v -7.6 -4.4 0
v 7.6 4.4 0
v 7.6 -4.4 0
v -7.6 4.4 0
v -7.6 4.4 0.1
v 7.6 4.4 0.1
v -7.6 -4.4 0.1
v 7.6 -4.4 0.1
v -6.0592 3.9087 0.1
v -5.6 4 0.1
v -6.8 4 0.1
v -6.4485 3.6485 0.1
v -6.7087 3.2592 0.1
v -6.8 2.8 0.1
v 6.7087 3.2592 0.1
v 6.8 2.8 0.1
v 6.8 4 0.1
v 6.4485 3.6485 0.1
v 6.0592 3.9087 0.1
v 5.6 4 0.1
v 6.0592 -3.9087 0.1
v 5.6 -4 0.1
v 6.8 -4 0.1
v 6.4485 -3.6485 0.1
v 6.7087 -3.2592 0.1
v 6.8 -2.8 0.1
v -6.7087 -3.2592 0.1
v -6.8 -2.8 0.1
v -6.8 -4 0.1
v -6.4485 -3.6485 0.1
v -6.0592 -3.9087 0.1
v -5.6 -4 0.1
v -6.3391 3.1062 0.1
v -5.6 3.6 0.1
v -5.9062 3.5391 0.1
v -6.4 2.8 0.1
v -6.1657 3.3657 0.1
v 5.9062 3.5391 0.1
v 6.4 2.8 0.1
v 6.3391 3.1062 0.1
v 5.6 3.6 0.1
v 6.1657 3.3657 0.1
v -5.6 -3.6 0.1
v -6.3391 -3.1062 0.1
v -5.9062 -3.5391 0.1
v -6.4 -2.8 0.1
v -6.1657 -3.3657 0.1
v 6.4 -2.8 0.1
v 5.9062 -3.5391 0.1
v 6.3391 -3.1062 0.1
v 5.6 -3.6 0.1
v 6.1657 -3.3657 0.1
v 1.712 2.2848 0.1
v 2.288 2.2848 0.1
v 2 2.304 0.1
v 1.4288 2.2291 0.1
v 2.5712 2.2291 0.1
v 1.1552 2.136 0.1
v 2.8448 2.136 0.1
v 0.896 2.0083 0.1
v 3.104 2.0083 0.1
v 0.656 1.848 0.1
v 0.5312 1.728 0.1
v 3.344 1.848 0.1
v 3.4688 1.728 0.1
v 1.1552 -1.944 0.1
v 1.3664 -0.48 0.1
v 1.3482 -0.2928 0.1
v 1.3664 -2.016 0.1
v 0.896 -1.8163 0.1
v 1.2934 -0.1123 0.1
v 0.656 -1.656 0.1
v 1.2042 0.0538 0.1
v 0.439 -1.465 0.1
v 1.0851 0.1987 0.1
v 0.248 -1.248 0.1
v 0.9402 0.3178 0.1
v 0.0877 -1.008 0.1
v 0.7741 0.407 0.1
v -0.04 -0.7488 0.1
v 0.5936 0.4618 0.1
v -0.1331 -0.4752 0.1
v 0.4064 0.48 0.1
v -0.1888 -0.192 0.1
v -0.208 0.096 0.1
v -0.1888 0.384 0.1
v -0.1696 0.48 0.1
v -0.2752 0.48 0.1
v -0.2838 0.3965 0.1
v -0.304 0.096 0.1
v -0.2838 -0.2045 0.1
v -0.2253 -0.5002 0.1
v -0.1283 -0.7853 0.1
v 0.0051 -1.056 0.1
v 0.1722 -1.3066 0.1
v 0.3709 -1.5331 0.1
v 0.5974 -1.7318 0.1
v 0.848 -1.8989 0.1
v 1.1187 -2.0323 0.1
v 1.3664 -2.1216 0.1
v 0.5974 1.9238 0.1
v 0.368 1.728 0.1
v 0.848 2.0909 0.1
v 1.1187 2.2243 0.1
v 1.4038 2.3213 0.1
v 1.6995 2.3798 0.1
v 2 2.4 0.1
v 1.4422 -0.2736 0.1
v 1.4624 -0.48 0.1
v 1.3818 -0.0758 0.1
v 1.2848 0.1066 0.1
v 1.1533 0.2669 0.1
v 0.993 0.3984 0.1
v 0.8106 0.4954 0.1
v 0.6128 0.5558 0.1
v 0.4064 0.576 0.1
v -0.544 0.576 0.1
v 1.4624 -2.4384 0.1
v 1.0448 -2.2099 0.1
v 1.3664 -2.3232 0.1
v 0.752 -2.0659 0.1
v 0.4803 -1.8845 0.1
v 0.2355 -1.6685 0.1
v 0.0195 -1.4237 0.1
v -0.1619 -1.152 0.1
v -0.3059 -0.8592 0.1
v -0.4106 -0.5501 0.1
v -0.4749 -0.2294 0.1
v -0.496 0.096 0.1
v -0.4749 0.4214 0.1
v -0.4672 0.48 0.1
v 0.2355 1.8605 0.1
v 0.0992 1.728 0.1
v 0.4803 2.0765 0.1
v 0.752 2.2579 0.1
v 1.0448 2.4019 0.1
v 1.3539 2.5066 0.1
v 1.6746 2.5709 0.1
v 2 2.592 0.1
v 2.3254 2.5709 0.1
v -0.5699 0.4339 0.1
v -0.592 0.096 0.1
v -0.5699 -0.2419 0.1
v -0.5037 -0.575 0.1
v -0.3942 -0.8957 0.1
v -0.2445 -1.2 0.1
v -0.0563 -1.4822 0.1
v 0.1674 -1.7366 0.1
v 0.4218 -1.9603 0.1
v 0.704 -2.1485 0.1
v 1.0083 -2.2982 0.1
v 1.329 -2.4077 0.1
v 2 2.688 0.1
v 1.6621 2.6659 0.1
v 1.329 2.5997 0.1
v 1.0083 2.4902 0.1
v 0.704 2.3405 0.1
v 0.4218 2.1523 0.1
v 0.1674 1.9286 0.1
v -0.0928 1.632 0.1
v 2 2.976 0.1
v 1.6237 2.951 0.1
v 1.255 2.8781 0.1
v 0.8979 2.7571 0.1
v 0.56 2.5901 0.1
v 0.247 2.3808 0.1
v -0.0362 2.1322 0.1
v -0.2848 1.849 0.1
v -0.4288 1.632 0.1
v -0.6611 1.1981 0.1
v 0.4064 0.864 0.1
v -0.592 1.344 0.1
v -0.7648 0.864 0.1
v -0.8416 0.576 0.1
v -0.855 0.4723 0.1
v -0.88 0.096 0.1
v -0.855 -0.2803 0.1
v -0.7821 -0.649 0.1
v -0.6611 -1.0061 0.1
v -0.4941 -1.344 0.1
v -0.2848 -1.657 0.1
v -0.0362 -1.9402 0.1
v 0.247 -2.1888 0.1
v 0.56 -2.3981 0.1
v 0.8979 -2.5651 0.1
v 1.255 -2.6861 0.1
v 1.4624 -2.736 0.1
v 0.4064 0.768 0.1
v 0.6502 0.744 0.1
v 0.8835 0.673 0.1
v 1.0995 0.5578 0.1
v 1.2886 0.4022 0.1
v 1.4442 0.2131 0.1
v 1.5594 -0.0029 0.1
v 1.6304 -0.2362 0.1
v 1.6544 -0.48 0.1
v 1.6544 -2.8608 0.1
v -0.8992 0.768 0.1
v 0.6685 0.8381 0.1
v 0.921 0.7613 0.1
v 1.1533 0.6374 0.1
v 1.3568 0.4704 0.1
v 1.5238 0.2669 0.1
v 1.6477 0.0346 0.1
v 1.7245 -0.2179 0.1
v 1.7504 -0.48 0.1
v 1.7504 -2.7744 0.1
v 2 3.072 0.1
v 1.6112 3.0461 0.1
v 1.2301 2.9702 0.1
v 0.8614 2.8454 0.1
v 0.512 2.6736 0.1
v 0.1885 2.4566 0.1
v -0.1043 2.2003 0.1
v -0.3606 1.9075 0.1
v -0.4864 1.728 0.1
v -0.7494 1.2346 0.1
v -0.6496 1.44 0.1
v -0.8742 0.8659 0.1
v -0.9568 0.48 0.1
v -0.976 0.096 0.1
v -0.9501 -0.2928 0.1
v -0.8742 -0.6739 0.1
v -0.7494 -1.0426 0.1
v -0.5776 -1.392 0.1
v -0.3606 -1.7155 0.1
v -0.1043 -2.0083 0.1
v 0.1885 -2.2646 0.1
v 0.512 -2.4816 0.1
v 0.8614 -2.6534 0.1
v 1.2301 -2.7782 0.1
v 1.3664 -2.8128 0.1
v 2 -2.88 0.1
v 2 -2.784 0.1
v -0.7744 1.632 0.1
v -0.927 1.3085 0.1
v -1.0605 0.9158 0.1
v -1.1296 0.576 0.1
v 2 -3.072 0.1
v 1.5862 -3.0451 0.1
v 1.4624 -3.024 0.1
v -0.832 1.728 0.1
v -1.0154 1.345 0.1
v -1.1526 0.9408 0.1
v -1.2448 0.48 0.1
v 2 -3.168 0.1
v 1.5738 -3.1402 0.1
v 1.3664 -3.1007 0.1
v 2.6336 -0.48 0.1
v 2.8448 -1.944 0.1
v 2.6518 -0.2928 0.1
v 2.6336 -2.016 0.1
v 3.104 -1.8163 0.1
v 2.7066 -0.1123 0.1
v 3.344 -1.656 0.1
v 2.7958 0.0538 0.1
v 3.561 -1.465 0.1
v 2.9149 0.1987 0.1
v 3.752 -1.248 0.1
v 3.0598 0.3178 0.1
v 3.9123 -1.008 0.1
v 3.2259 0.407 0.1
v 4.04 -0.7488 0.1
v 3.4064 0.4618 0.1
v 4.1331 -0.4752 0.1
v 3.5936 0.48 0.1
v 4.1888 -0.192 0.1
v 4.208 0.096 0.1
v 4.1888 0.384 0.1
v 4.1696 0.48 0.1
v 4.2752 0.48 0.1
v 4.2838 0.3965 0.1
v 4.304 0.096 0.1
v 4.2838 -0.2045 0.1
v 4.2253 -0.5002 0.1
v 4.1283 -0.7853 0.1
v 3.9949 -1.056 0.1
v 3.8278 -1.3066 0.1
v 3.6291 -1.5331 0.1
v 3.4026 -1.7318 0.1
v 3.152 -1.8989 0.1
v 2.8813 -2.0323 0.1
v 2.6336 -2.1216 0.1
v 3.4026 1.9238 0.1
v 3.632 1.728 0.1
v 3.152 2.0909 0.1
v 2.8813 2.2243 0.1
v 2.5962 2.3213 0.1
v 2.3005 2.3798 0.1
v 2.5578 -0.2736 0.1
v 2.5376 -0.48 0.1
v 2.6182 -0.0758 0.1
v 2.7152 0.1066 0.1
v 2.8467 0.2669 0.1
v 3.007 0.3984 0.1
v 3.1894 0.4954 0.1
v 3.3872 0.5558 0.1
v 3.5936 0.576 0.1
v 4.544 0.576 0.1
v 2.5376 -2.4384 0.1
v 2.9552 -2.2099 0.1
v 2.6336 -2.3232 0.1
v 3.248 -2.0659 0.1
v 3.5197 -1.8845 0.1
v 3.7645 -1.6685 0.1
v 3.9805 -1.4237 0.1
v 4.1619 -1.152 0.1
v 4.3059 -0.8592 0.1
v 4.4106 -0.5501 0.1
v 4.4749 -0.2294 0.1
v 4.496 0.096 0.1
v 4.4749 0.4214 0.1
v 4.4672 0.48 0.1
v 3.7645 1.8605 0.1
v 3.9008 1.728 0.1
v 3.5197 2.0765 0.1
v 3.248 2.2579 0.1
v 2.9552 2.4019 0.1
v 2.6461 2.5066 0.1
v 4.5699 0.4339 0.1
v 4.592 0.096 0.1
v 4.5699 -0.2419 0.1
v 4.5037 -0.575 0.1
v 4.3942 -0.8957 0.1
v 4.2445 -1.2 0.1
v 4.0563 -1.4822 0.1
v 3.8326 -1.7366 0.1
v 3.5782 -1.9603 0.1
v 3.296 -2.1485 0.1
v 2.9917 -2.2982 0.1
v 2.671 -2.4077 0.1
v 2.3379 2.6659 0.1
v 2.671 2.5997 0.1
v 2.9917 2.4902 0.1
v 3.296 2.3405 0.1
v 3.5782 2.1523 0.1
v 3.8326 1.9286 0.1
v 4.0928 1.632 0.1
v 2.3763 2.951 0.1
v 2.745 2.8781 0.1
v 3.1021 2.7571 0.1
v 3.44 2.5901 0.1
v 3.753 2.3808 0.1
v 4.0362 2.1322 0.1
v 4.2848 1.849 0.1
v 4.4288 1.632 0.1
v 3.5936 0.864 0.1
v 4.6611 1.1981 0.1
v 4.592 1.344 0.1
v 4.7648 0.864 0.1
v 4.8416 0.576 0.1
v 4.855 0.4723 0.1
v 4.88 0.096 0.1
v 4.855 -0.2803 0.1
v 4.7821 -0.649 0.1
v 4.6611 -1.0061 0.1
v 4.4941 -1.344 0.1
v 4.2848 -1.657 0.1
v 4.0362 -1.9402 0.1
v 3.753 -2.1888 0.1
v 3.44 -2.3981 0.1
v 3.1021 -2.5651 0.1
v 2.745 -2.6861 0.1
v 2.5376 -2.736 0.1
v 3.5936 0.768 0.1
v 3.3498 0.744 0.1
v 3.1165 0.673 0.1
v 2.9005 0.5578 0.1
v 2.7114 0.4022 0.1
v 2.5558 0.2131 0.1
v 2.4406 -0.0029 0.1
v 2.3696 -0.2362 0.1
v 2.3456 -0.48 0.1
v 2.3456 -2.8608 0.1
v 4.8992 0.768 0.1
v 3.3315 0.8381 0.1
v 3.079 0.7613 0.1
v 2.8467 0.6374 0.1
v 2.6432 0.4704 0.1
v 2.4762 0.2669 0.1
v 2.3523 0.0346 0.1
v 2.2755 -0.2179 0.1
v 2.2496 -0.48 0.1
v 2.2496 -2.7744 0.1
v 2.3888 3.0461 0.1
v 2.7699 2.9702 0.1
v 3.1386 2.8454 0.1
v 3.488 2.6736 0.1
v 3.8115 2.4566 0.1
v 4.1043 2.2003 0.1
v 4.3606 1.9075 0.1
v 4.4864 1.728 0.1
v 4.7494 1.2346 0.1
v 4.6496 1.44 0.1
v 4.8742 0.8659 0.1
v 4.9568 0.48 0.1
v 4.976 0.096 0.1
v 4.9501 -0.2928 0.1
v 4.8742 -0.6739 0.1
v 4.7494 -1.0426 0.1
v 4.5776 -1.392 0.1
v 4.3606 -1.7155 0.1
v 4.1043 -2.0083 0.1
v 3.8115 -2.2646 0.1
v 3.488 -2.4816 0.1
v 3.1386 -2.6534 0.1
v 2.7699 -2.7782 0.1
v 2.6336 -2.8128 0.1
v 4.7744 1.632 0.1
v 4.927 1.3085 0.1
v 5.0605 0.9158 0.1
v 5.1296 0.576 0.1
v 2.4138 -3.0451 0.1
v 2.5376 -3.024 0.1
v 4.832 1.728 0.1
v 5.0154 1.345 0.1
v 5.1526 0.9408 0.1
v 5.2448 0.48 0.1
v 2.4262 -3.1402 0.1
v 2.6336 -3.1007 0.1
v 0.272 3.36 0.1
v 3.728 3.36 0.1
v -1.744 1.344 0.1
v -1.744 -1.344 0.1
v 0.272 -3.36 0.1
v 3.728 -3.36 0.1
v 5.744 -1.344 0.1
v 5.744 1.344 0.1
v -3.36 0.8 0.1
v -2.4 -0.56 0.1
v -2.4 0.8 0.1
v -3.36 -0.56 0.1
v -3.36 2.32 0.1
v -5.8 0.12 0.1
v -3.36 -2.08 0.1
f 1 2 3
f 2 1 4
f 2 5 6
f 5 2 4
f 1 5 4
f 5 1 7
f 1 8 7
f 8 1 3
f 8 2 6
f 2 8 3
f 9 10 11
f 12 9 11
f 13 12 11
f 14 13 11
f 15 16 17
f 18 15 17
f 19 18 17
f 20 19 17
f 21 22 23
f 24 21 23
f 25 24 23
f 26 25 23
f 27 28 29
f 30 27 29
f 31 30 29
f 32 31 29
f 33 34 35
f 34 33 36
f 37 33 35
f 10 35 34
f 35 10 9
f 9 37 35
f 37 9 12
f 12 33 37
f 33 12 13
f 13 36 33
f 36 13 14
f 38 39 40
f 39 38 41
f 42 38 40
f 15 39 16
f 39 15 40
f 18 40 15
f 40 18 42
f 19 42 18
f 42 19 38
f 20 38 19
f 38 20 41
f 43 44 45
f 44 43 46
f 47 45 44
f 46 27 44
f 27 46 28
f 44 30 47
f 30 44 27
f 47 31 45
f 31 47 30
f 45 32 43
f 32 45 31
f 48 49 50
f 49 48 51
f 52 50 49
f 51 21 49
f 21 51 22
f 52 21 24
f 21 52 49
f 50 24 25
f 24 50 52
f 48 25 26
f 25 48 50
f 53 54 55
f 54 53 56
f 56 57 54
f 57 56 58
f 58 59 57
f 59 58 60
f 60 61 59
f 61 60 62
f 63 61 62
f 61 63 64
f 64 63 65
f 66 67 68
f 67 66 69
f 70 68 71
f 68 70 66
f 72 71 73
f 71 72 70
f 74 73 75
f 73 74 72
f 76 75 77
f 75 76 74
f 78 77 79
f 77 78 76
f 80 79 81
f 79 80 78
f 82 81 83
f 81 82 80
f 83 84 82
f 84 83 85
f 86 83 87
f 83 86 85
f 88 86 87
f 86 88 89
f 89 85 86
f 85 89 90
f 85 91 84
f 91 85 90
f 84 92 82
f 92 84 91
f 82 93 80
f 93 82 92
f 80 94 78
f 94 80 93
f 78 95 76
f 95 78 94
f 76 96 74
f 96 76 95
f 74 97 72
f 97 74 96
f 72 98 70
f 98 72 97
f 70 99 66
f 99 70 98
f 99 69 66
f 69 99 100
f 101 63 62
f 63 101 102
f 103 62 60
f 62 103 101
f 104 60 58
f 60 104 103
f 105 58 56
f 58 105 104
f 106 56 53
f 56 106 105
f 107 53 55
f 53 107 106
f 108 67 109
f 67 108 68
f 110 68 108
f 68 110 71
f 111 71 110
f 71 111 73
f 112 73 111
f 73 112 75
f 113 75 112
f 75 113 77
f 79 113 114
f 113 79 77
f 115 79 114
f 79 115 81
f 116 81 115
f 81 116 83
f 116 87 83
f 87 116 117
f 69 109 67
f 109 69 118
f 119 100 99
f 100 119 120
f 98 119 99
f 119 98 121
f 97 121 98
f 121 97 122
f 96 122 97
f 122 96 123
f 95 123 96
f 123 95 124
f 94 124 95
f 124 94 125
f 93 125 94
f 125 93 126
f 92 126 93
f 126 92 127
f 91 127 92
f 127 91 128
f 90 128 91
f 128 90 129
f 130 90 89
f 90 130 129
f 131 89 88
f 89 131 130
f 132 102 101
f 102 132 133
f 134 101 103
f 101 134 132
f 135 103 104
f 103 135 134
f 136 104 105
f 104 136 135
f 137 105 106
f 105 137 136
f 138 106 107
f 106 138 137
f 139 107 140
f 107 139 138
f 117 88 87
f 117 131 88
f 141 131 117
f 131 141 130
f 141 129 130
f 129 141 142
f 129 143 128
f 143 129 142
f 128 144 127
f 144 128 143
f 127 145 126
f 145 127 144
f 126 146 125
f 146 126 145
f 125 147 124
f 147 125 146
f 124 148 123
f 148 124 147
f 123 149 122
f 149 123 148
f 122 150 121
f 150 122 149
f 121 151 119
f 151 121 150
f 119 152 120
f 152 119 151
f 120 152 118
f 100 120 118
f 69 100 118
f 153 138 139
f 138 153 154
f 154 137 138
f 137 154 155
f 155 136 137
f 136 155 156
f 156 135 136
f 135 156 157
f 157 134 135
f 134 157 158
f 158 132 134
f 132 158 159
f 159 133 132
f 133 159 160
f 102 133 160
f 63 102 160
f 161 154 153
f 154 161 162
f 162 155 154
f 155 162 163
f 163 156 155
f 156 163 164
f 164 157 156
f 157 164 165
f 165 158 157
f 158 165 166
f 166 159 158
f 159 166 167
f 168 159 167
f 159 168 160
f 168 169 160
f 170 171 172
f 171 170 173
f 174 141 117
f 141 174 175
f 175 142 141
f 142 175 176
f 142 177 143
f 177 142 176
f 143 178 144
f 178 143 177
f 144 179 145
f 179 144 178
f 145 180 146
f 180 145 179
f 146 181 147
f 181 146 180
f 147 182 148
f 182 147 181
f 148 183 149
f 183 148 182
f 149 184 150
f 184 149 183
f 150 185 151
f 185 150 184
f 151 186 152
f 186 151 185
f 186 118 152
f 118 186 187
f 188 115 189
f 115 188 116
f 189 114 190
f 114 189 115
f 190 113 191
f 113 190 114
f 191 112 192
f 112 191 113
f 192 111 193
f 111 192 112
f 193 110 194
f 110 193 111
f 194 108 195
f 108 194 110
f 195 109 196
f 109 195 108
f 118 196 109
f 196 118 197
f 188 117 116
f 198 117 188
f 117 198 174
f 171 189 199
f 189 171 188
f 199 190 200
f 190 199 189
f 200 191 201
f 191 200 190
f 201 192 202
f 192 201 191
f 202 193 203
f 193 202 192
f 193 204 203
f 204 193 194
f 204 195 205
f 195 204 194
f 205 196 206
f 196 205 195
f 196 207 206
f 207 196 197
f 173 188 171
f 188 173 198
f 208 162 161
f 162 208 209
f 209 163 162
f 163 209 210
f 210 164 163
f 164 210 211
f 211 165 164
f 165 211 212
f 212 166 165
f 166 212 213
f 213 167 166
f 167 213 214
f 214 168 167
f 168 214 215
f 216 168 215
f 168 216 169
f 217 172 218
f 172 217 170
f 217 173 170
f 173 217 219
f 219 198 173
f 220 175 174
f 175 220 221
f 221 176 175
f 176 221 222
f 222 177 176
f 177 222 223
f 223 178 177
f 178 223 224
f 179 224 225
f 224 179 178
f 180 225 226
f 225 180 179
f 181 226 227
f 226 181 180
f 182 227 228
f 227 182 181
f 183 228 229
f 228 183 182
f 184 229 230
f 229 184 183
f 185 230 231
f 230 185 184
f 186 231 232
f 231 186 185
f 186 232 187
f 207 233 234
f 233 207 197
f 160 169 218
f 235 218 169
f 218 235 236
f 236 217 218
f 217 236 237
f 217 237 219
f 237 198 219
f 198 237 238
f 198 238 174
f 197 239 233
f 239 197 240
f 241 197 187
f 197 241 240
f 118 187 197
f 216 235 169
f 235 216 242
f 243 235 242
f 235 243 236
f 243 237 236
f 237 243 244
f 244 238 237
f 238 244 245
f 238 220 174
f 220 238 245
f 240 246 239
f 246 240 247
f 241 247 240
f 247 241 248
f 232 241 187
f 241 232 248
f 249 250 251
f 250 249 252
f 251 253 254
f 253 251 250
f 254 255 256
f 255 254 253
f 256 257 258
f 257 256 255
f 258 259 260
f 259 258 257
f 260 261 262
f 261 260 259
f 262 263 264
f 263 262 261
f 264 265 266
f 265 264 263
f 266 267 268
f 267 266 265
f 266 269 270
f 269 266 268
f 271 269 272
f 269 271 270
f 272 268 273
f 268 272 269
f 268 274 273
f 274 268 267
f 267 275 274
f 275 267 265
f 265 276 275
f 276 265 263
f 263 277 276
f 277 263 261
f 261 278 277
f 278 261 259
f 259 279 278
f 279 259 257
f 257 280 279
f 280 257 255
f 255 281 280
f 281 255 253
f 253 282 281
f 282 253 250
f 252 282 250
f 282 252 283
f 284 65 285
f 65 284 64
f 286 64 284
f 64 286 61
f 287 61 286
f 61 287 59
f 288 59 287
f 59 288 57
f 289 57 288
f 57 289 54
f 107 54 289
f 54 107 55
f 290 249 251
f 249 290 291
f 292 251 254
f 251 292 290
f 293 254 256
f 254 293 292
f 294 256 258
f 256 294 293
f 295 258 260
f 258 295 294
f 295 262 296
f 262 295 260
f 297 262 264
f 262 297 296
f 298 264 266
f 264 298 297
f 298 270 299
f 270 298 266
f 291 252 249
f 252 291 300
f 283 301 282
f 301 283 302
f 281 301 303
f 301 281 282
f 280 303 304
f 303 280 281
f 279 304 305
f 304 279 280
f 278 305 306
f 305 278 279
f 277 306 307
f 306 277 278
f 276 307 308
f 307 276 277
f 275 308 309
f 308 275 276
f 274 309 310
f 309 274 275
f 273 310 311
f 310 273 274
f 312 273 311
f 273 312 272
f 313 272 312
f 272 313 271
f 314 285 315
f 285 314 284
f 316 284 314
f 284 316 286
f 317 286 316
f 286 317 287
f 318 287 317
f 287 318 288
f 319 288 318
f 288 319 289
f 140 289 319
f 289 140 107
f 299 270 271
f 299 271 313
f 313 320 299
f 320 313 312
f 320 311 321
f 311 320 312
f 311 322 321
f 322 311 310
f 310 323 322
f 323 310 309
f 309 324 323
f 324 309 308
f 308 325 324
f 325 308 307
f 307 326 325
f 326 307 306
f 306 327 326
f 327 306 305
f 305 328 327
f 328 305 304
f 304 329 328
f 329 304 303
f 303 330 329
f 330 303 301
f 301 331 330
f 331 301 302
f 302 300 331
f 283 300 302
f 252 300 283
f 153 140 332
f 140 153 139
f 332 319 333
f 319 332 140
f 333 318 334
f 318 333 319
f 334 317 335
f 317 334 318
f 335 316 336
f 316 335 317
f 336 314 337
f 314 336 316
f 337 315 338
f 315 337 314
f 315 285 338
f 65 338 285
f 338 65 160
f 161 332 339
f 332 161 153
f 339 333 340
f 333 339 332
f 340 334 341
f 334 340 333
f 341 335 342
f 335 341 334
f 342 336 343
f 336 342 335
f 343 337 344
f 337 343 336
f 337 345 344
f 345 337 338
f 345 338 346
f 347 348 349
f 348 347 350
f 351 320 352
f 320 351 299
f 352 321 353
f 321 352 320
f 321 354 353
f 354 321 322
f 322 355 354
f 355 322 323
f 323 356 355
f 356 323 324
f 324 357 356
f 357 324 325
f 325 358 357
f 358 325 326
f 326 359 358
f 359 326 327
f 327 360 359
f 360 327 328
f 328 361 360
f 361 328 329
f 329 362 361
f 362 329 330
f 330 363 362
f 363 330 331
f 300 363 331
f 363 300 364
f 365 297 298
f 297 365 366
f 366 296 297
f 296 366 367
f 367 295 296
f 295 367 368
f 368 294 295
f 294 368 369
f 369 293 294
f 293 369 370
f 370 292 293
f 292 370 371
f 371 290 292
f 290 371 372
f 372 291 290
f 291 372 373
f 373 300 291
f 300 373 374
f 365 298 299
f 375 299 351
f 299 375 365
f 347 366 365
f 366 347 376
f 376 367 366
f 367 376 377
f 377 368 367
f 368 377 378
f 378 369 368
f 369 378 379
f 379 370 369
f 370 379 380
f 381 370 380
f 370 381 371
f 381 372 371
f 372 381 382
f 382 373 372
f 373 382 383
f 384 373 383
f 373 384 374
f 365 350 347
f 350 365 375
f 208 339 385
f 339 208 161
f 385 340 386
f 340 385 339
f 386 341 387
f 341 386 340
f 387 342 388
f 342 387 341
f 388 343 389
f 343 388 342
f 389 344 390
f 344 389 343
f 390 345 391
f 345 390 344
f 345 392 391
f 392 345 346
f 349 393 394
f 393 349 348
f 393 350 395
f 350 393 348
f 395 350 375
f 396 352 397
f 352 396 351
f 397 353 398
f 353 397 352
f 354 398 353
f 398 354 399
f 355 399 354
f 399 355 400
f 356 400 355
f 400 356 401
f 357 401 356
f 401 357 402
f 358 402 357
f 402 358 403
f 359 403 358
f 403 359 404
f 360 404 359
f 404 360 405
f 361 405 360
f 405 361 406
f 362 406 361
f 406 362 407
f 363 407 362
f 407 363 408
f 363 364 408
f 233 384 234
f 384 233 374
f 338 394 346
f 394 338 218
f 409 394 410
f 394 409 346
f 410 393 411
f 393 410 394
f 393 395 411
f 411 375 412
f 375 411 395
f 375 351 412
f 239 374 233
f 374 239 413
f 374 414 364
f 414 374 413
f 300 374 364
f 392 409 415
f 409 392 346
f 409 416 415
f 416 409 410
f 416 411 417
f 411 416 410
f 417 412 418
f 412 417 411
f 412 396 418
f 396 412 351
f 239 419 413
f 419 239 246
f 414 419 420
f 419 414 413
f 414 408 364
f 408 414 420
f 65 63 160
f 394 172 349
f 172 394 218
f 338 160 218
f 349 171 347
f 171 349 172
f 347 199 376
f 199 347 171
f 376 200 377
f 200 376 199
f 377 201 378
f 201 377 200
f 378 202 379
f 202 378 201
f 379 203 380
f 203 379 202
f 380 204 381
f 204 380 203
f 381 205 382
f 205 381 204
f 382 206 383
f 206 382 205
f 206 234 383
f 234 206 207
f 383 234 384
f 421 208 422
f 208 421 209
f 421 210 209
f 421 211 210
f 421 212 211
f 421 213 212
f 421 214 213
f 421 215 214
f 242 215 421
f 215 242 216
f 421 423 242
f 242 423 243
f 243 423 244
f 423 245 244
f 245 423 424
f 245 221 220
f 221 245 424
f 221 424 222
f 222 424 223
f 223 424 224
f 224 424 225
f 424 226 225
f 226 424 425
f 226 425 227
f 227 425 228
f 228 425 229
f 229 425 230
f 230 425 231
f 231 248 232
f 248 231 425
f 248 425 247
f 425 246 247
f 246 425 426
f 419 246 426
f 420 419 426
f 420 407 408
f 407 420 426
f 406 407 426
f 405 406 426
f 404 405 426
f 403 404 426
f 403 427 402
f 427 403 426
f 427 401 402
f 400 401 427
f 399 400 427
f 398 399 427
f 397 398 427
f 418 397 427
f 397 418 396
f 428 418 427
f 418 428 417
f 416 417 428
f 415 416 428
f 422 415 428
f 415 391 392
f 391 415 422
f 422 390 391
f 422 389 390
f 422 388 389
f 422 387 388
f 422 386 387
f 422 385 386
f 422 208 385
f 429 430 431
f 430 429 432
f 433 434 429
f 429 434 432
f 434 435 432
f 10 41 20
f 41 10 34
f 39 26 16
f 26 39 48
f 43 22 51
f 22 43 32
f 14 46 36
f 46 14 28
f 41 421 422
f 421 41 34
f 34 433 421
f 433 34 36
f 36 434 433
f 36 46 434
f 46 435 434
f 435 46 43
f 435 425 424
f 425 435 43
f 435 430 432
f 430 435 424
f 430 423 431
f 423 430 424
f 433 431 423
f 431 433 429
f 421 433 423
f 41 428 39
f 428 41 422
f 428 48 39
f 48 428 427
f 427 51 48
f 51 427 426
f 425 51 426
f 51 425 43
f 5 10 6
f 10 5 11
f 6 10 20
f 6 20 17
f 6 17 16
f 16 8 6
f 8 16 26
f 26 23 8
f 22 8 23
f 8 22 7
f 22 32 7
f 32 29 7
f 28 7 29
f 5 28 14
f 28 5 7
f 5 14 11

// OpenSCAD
use <../lib.scad>
use <../p/1-4chrd.scad>
use <../p/1-4ndis.scad>
use <../p/1-4ring2.scad>
use <../p/box5-12.scad>
use <s/163555fs01.scad>
function ldraw_lib__163555h() = [
// 0 Sticker  1.1 x  1.9 with Monorail Station Direction Sign - Left
// 0 Name: 163555h.dat
// 0 Author: Takeshi Takahashi [RainbowDolphin]
// 0 !LDRAW_ORG Part UPDATE 2023-02
// 0 !LICENSE Licensed under CC BY 4.0 : see CAreadme.txt
// 
// 0 BFC CERTIFY CCW
  [0,"BFC","CERTIFY"],
  [0,"BFC","CCW"],
// 
// 0 !KEYWORDS Bricklink 6399stk01, Brickowl 458337, Rebrickable 163555, set 6399
// 
// 0 !HISTORY 2023-04-17 [OrionP] Official Update 2023-02
// 
// 
// 1 16 0 -0.25 0 19 0 0 0 0.25 0 0 0 11 box5-12.dat
  [1,16,0,-0.25,0,19,0,0,0,0.25,0,0,0,11, ldraw_lib__box5_12()],
// 1 16 -14 -.25 7 0 0 -3 0 1 0 3 0 0 1-4ndis.dat
  [1,16,-14,-.25,7,0,0,-3,0,1,0,3,0,0, ldraw_lib__1_4ndis()],
// 1 16 14 -.25 7 3 0 0 0 1 0 0 0 3 1-4ndis.dat
  [1,16,14,-.25,7,3,0,0,0,1,0,0,0,3, ldraw_lib__1_4ndis()],
// 1 16 14 -.25 -7 0 0 3 0 1 0 -3 0 0 1-4ndis.dat
  [1,16,14,-.25,-7,0,0,3,0,1,0,-3,0,0, ldraw_lib__1_4ndis()],
// 1 16 -14 -.25 -7 -3 0 0 0 1 0 0 0 -3 1-4ndis.dat
  [1,16,-14,-.25,-7,-3,0,0,0,1,0,0,0,-3, ldraw_lib__1_4ndis()],
// 0 BFC NOCLIP
  [0,"BFC","NOCLIP"],
// 1 15 -14 -.25 7 0 0 -2 0 1 0 2 0 0 1-4chrd.dat
  [1,15,-14,-.25,7,0,0,-2,0,1,0,2,0,0, ldraw_lib__1_4chrd()],
// 1 0 -14 -.25 7 0 0 -1 0 1 0 1 0 0 1-4ring2.dat
  [1,0,-14,-.25,7,0,0,-1,0,1,0,1,0,0, ldraw_lib__1_4ring2()],
// 1 15 14 -.25 7 2 0 0 0 1 0 0 0 2 1-4chrd.dat
  [1,15,14,-.25,7,2,0,0,0,1,0,0,0,2, ldraw_lib__1_4chrd()],
// 1 0 14 -.25 7 1 0 0 0 1 0 0 0 1 1-4ring2.dat
  [1,0,14,-.25,7,1,0,0,0,1,0,0,0,1, ldraw_lib__1_4ring2()],
// 1 15 -14 -.25 -7 -2 0 0 0 1 0 0 0 -2 1-4chrd.dat
  [1,15,-14,-.25,-7,-2,0,0,0,1,0,0,0,-2, ldraw_lib__1_4chrd()],
// 1 0 -14 -.25 -7 -1 0 0 0 1 0 0 0 -1 1-4ring2.dat
  [1,0,-14,-.25,-7,-1,0,0,0,1,0,0,0,-1, ldraw_lib__1_4ring2()],
// 1 15 14 -.25 -7 0 0 2 0 1 0 -2 0 0 1-4chrd.dat
  [1,15,14,-.25,-7,0,0,2,0,1,0,-2,0,0, ldraw_lib__1_4chrd()],
// 1 0 14 -.25 -7 0 0 1 0 1 0 -1 0 0 1-4ring2.dat
  [1,0,14,-.25,-7,0,0,1,0,1,0,-1,0,0, ldraw_lib__1_4ring2()],
// 1 15 5 -.25 0 .24 0 0 0 1 0 0 0 .24 s\163555fs01.dat
  [1,15,5,-.25,0,.24,0,0,0,1,0,0,0,.24, ldraw_lib__s__163555fs01()],
// 4 4 -6 -.25 -1.4 -6 -.25 2 -8.4 -.25 2 -8.4 -.25 -1.4
  [4,4,-6,-.25,-1.4,-6,-.25,2,-8.4,-.25,2,-8.4,-.25,-1.4],
// 3 4 -8.4 -.25 5.8 -14.5 -.25 .3 -8.4 -.25 2
  [3,4,-8.4,-.25,5.8,-14.5,-.25,.3,-8.4,-.25,2],
// 3 4 -8.4 -.25 2 -14.5 -.25 .3 -8.4 -.25 -1.4
  [3,4,-8.4,-.25,2,-14.5,-.25,.3,-8.4,-.25,-1.4],
// 3 4 -14.5 -.25 .3 -8.4 -.25 -5.2 -8.4 -.25 -1.4
  [3,4,-14.5,-.25,.3,-8.4,-.25,-5.2,-8.4,-.25,-1.4],
// 4 0 14 -.25 10 -14 -.25 10 -14 -.25 9 14 -.25 9
  [4,0,14,-.25,10,-14,-.25,10,-14,-.25,9,14,-.25,9],
// 4 0 17 -.25 7 16 -.25 7 16 -.25 -7 17 -.25 -7
  [4,0,17,-.25,7,16,-.25,7,16,-.25,-7,17,-.25,-7],
// 4 0 14 -.25 -9 -14 -.25 -9 -14 -.25 -10 14 -.25 -10
  [4,0,14,-.25,-9,-14,-.25,-9,-14,-.25,-10,14,-.25,-10],
// 4 0 -16 -.25 7 -17 -.25 7 -17 -.25 -7 -16 -.25 -7
  [4,0,-16,-.25,7,-17,-.25,7,-17,-.25,-7,-16,-.25,-7],
// 4 15 14 -.25 9 -14 -.25 9 .68 -.25 8.4 9.32 -.25 8.4
  [4,15,14,-.25,9,-14,-.25,9,.68,-.25,8.4,9.32,-.25,8.4],
// 4 15 -8.4 -.25 5.8 .68 -.25 8.4 -14 -.25 9 -16 -.25 7
  [4,15,-8.4,-.25,5.8,.68,-.25,8.4,-14,-.25,9,-16,-.25,7],
// 3 15 -16 -.25 7 -14.5 -.25 .3 -8.4 -.25 5.8
  [3,15,-16,-.25,7,-14.5,-.25,.3,-8.4,-.25,5.8],
// 3 15 -16 -.25 7 -16 -.25 -7 -14.5 -.25 .3
  [3,15,-16,-.25,7,-16,-.25,-7,-14.5,-.25,.3],
// 4 15 -8.4 -.25 -5.2 -14.5 -.25 .3 -16 -.25 -7 -14 -.25 -9
  [4,15,-8.4,-.25,-5.2,-14.5,-.25,.3,-16,-.25,-7,-14,-.25,-9],
// 4 15 -8.4 -.25 -5.2 -14 -.25 -9 .68 -.25 -8.4 -4.36 -.25 -3.36
  [4,15,-8.4,-.25,-5.2,-14,-.25,-9,.68,-.25,-8.4,-4.36,-.25,-3.36],
// 4 15 -8.4 -.25 -1.4 -8.4 -.25 -5.2 -4.36 -.25 -3.36 -6 -.25 -1.4
  [4,15,-8.4,-.25,-1.4,-8.4,-.25,-5.2,-4.36,-.25,-3.36,-6,-.25,-1.4],
// 4 15 -6 -.25 2 -6 -.25 -1.4 -4.36 -.25 -3.36 -4.36 -.25 3.36
  [4,15,-6,-.25,2,-6,-.25,-1.4,-4.36,-.25,-3.36,-4.36,-.25,3.36],
// 4 15 -8.4 -.25 2 -6 -.25 2 -4.36 -.25 3.36 -8.4 -.25 5.8
  [4,15,-8.4,-.25,2,-6,-.25,2,-4.36,-.25,3.36,-8.4,-.25,5.8],
// 3 15 .68 -.25 8.4 -8.4 -.25 5.8 -4.36 -.25 3.36
  [3,15,.68,-.25,8.4,-8.4,-.25,5.8,-4.36,-.25,3.36],
// 4 15 16 -.25 7 14 -.25 9 9.32 -.25 8.4 14.36 -.25 3.36
  [4,15,16,-.25,7,14,-.25,9,9.32,-.25,8.4,14.36,-.25,3.36],
// 4 15 16 -.25 -7 16 -.25 7 14.36 -.25 3.36 14.36 -.25 -3.36
  [4,15,16,-.25,-7,16,-.25,7,14.36,-.25,3.36,14.36,-.25,-3.36],
// 4 15 14 -.25 -9 16 -.25 -7 14.36 -.25 -3.36 9.32 -.25 -8.4
  [4,15,14,-.25,-9,16,-.25,-7,14.36,-.25,-3.36,9.32,-.25,-8.4],
// 4 15 14 -.25 -9 9.32 -.25 -8.4 .68 -.25 -8.4 -14 -.25 -9
  [4,15,14,-.25,-9,9.32,-.25,-8.4,.68,-.25,-8.4,-14,-.25,-9],
// 0 BFC CLIP
  [0,"BFC","CLIP"],
// 4 16 -19 -.25 11 -17 -.25 10 -14 -.25 10 19 -.25 11
  [4,16,-19,-.25,11,-17,-.25,10,-14,-.25,10,19,-.25,11],
// 3 16 19 -.25 11 -14 -.25 10 14 -.25 10
  [3,16,19,-.25,11,-14,-.25,10,14,-.25,10],
// 3 16 19 -.25 11 14 -.25 10 17 -.25 10
  [3,16,19,-.25,11,14,-.25,10,17,-.25,10],
// 3 16 19 -.25 11 17 -.25 10 17 -.25 7
  [3,16,19,-.25,11,17,-.25,10,17,-.25,7],
// 4 16 19 -.25 11 17 -.25 7 17 -.25 -7 19 -.25 -11
  [4,16,19,-.25,11,17,-.25,7,17,-.25,-7,19,-.25,-11],
// 3 16 17 -.25 -7 17 -.25 -10 19 -.25 -11
  [3,16,17,-.25,-7,17,-.25,-10,19,-.25,-11],
// 4 16 19 -.25 -11 17 -.25 -10 14 -.25 -10 -19 -.25 -11
  [4,16,19,-.25,-11,17,-.25,-10,14,-.25,-10,-19,-.25,-11],
// 3 16 14 -.25 -10 -14 -.25 -10 -19 -.25 -11
  [3,16,14,-.25,-10,-14,-.25,-10,-19,-.25,-11],
// 3 16 -14 -.25 -10 -17 -.25 -10 -19 -.25 -11
  [3,16,-14,-.25,-10,-17,-.25,-10,-19,-.25,-11],
// 3 16 -17 -.25 -7 -19 -.25 -11 -17 -.25 -10
  [3,16,-17,-.25,-7,-19,-.25,-11,-17,-.25,-10],
// 4 16 -19 -.25 -11 -17 -.25 -7 -17 -.25 7 -19 -.25 11
  [4,16,-19,-.25,-11,-17,-.25,-7,-17,-.25,7,-19,-.25,11],
// 3 16 -19 -.25 11 -17 -.25 7 -17 -.25 10
  [3,16,-19,-.25,11,-17,-.25,7,-17,-.25,10],
];
module ldraw_lib__163555h(step=0, col=false, unit=2/5, alt=false, line=0.2, solid=!$preview)
    makepoly(ldraw_lib__163555h(), step=step, col=col, unit=unit, alt=alt, line=line, solid=solid);
ldraw_lib__163555h(line=0.2);
